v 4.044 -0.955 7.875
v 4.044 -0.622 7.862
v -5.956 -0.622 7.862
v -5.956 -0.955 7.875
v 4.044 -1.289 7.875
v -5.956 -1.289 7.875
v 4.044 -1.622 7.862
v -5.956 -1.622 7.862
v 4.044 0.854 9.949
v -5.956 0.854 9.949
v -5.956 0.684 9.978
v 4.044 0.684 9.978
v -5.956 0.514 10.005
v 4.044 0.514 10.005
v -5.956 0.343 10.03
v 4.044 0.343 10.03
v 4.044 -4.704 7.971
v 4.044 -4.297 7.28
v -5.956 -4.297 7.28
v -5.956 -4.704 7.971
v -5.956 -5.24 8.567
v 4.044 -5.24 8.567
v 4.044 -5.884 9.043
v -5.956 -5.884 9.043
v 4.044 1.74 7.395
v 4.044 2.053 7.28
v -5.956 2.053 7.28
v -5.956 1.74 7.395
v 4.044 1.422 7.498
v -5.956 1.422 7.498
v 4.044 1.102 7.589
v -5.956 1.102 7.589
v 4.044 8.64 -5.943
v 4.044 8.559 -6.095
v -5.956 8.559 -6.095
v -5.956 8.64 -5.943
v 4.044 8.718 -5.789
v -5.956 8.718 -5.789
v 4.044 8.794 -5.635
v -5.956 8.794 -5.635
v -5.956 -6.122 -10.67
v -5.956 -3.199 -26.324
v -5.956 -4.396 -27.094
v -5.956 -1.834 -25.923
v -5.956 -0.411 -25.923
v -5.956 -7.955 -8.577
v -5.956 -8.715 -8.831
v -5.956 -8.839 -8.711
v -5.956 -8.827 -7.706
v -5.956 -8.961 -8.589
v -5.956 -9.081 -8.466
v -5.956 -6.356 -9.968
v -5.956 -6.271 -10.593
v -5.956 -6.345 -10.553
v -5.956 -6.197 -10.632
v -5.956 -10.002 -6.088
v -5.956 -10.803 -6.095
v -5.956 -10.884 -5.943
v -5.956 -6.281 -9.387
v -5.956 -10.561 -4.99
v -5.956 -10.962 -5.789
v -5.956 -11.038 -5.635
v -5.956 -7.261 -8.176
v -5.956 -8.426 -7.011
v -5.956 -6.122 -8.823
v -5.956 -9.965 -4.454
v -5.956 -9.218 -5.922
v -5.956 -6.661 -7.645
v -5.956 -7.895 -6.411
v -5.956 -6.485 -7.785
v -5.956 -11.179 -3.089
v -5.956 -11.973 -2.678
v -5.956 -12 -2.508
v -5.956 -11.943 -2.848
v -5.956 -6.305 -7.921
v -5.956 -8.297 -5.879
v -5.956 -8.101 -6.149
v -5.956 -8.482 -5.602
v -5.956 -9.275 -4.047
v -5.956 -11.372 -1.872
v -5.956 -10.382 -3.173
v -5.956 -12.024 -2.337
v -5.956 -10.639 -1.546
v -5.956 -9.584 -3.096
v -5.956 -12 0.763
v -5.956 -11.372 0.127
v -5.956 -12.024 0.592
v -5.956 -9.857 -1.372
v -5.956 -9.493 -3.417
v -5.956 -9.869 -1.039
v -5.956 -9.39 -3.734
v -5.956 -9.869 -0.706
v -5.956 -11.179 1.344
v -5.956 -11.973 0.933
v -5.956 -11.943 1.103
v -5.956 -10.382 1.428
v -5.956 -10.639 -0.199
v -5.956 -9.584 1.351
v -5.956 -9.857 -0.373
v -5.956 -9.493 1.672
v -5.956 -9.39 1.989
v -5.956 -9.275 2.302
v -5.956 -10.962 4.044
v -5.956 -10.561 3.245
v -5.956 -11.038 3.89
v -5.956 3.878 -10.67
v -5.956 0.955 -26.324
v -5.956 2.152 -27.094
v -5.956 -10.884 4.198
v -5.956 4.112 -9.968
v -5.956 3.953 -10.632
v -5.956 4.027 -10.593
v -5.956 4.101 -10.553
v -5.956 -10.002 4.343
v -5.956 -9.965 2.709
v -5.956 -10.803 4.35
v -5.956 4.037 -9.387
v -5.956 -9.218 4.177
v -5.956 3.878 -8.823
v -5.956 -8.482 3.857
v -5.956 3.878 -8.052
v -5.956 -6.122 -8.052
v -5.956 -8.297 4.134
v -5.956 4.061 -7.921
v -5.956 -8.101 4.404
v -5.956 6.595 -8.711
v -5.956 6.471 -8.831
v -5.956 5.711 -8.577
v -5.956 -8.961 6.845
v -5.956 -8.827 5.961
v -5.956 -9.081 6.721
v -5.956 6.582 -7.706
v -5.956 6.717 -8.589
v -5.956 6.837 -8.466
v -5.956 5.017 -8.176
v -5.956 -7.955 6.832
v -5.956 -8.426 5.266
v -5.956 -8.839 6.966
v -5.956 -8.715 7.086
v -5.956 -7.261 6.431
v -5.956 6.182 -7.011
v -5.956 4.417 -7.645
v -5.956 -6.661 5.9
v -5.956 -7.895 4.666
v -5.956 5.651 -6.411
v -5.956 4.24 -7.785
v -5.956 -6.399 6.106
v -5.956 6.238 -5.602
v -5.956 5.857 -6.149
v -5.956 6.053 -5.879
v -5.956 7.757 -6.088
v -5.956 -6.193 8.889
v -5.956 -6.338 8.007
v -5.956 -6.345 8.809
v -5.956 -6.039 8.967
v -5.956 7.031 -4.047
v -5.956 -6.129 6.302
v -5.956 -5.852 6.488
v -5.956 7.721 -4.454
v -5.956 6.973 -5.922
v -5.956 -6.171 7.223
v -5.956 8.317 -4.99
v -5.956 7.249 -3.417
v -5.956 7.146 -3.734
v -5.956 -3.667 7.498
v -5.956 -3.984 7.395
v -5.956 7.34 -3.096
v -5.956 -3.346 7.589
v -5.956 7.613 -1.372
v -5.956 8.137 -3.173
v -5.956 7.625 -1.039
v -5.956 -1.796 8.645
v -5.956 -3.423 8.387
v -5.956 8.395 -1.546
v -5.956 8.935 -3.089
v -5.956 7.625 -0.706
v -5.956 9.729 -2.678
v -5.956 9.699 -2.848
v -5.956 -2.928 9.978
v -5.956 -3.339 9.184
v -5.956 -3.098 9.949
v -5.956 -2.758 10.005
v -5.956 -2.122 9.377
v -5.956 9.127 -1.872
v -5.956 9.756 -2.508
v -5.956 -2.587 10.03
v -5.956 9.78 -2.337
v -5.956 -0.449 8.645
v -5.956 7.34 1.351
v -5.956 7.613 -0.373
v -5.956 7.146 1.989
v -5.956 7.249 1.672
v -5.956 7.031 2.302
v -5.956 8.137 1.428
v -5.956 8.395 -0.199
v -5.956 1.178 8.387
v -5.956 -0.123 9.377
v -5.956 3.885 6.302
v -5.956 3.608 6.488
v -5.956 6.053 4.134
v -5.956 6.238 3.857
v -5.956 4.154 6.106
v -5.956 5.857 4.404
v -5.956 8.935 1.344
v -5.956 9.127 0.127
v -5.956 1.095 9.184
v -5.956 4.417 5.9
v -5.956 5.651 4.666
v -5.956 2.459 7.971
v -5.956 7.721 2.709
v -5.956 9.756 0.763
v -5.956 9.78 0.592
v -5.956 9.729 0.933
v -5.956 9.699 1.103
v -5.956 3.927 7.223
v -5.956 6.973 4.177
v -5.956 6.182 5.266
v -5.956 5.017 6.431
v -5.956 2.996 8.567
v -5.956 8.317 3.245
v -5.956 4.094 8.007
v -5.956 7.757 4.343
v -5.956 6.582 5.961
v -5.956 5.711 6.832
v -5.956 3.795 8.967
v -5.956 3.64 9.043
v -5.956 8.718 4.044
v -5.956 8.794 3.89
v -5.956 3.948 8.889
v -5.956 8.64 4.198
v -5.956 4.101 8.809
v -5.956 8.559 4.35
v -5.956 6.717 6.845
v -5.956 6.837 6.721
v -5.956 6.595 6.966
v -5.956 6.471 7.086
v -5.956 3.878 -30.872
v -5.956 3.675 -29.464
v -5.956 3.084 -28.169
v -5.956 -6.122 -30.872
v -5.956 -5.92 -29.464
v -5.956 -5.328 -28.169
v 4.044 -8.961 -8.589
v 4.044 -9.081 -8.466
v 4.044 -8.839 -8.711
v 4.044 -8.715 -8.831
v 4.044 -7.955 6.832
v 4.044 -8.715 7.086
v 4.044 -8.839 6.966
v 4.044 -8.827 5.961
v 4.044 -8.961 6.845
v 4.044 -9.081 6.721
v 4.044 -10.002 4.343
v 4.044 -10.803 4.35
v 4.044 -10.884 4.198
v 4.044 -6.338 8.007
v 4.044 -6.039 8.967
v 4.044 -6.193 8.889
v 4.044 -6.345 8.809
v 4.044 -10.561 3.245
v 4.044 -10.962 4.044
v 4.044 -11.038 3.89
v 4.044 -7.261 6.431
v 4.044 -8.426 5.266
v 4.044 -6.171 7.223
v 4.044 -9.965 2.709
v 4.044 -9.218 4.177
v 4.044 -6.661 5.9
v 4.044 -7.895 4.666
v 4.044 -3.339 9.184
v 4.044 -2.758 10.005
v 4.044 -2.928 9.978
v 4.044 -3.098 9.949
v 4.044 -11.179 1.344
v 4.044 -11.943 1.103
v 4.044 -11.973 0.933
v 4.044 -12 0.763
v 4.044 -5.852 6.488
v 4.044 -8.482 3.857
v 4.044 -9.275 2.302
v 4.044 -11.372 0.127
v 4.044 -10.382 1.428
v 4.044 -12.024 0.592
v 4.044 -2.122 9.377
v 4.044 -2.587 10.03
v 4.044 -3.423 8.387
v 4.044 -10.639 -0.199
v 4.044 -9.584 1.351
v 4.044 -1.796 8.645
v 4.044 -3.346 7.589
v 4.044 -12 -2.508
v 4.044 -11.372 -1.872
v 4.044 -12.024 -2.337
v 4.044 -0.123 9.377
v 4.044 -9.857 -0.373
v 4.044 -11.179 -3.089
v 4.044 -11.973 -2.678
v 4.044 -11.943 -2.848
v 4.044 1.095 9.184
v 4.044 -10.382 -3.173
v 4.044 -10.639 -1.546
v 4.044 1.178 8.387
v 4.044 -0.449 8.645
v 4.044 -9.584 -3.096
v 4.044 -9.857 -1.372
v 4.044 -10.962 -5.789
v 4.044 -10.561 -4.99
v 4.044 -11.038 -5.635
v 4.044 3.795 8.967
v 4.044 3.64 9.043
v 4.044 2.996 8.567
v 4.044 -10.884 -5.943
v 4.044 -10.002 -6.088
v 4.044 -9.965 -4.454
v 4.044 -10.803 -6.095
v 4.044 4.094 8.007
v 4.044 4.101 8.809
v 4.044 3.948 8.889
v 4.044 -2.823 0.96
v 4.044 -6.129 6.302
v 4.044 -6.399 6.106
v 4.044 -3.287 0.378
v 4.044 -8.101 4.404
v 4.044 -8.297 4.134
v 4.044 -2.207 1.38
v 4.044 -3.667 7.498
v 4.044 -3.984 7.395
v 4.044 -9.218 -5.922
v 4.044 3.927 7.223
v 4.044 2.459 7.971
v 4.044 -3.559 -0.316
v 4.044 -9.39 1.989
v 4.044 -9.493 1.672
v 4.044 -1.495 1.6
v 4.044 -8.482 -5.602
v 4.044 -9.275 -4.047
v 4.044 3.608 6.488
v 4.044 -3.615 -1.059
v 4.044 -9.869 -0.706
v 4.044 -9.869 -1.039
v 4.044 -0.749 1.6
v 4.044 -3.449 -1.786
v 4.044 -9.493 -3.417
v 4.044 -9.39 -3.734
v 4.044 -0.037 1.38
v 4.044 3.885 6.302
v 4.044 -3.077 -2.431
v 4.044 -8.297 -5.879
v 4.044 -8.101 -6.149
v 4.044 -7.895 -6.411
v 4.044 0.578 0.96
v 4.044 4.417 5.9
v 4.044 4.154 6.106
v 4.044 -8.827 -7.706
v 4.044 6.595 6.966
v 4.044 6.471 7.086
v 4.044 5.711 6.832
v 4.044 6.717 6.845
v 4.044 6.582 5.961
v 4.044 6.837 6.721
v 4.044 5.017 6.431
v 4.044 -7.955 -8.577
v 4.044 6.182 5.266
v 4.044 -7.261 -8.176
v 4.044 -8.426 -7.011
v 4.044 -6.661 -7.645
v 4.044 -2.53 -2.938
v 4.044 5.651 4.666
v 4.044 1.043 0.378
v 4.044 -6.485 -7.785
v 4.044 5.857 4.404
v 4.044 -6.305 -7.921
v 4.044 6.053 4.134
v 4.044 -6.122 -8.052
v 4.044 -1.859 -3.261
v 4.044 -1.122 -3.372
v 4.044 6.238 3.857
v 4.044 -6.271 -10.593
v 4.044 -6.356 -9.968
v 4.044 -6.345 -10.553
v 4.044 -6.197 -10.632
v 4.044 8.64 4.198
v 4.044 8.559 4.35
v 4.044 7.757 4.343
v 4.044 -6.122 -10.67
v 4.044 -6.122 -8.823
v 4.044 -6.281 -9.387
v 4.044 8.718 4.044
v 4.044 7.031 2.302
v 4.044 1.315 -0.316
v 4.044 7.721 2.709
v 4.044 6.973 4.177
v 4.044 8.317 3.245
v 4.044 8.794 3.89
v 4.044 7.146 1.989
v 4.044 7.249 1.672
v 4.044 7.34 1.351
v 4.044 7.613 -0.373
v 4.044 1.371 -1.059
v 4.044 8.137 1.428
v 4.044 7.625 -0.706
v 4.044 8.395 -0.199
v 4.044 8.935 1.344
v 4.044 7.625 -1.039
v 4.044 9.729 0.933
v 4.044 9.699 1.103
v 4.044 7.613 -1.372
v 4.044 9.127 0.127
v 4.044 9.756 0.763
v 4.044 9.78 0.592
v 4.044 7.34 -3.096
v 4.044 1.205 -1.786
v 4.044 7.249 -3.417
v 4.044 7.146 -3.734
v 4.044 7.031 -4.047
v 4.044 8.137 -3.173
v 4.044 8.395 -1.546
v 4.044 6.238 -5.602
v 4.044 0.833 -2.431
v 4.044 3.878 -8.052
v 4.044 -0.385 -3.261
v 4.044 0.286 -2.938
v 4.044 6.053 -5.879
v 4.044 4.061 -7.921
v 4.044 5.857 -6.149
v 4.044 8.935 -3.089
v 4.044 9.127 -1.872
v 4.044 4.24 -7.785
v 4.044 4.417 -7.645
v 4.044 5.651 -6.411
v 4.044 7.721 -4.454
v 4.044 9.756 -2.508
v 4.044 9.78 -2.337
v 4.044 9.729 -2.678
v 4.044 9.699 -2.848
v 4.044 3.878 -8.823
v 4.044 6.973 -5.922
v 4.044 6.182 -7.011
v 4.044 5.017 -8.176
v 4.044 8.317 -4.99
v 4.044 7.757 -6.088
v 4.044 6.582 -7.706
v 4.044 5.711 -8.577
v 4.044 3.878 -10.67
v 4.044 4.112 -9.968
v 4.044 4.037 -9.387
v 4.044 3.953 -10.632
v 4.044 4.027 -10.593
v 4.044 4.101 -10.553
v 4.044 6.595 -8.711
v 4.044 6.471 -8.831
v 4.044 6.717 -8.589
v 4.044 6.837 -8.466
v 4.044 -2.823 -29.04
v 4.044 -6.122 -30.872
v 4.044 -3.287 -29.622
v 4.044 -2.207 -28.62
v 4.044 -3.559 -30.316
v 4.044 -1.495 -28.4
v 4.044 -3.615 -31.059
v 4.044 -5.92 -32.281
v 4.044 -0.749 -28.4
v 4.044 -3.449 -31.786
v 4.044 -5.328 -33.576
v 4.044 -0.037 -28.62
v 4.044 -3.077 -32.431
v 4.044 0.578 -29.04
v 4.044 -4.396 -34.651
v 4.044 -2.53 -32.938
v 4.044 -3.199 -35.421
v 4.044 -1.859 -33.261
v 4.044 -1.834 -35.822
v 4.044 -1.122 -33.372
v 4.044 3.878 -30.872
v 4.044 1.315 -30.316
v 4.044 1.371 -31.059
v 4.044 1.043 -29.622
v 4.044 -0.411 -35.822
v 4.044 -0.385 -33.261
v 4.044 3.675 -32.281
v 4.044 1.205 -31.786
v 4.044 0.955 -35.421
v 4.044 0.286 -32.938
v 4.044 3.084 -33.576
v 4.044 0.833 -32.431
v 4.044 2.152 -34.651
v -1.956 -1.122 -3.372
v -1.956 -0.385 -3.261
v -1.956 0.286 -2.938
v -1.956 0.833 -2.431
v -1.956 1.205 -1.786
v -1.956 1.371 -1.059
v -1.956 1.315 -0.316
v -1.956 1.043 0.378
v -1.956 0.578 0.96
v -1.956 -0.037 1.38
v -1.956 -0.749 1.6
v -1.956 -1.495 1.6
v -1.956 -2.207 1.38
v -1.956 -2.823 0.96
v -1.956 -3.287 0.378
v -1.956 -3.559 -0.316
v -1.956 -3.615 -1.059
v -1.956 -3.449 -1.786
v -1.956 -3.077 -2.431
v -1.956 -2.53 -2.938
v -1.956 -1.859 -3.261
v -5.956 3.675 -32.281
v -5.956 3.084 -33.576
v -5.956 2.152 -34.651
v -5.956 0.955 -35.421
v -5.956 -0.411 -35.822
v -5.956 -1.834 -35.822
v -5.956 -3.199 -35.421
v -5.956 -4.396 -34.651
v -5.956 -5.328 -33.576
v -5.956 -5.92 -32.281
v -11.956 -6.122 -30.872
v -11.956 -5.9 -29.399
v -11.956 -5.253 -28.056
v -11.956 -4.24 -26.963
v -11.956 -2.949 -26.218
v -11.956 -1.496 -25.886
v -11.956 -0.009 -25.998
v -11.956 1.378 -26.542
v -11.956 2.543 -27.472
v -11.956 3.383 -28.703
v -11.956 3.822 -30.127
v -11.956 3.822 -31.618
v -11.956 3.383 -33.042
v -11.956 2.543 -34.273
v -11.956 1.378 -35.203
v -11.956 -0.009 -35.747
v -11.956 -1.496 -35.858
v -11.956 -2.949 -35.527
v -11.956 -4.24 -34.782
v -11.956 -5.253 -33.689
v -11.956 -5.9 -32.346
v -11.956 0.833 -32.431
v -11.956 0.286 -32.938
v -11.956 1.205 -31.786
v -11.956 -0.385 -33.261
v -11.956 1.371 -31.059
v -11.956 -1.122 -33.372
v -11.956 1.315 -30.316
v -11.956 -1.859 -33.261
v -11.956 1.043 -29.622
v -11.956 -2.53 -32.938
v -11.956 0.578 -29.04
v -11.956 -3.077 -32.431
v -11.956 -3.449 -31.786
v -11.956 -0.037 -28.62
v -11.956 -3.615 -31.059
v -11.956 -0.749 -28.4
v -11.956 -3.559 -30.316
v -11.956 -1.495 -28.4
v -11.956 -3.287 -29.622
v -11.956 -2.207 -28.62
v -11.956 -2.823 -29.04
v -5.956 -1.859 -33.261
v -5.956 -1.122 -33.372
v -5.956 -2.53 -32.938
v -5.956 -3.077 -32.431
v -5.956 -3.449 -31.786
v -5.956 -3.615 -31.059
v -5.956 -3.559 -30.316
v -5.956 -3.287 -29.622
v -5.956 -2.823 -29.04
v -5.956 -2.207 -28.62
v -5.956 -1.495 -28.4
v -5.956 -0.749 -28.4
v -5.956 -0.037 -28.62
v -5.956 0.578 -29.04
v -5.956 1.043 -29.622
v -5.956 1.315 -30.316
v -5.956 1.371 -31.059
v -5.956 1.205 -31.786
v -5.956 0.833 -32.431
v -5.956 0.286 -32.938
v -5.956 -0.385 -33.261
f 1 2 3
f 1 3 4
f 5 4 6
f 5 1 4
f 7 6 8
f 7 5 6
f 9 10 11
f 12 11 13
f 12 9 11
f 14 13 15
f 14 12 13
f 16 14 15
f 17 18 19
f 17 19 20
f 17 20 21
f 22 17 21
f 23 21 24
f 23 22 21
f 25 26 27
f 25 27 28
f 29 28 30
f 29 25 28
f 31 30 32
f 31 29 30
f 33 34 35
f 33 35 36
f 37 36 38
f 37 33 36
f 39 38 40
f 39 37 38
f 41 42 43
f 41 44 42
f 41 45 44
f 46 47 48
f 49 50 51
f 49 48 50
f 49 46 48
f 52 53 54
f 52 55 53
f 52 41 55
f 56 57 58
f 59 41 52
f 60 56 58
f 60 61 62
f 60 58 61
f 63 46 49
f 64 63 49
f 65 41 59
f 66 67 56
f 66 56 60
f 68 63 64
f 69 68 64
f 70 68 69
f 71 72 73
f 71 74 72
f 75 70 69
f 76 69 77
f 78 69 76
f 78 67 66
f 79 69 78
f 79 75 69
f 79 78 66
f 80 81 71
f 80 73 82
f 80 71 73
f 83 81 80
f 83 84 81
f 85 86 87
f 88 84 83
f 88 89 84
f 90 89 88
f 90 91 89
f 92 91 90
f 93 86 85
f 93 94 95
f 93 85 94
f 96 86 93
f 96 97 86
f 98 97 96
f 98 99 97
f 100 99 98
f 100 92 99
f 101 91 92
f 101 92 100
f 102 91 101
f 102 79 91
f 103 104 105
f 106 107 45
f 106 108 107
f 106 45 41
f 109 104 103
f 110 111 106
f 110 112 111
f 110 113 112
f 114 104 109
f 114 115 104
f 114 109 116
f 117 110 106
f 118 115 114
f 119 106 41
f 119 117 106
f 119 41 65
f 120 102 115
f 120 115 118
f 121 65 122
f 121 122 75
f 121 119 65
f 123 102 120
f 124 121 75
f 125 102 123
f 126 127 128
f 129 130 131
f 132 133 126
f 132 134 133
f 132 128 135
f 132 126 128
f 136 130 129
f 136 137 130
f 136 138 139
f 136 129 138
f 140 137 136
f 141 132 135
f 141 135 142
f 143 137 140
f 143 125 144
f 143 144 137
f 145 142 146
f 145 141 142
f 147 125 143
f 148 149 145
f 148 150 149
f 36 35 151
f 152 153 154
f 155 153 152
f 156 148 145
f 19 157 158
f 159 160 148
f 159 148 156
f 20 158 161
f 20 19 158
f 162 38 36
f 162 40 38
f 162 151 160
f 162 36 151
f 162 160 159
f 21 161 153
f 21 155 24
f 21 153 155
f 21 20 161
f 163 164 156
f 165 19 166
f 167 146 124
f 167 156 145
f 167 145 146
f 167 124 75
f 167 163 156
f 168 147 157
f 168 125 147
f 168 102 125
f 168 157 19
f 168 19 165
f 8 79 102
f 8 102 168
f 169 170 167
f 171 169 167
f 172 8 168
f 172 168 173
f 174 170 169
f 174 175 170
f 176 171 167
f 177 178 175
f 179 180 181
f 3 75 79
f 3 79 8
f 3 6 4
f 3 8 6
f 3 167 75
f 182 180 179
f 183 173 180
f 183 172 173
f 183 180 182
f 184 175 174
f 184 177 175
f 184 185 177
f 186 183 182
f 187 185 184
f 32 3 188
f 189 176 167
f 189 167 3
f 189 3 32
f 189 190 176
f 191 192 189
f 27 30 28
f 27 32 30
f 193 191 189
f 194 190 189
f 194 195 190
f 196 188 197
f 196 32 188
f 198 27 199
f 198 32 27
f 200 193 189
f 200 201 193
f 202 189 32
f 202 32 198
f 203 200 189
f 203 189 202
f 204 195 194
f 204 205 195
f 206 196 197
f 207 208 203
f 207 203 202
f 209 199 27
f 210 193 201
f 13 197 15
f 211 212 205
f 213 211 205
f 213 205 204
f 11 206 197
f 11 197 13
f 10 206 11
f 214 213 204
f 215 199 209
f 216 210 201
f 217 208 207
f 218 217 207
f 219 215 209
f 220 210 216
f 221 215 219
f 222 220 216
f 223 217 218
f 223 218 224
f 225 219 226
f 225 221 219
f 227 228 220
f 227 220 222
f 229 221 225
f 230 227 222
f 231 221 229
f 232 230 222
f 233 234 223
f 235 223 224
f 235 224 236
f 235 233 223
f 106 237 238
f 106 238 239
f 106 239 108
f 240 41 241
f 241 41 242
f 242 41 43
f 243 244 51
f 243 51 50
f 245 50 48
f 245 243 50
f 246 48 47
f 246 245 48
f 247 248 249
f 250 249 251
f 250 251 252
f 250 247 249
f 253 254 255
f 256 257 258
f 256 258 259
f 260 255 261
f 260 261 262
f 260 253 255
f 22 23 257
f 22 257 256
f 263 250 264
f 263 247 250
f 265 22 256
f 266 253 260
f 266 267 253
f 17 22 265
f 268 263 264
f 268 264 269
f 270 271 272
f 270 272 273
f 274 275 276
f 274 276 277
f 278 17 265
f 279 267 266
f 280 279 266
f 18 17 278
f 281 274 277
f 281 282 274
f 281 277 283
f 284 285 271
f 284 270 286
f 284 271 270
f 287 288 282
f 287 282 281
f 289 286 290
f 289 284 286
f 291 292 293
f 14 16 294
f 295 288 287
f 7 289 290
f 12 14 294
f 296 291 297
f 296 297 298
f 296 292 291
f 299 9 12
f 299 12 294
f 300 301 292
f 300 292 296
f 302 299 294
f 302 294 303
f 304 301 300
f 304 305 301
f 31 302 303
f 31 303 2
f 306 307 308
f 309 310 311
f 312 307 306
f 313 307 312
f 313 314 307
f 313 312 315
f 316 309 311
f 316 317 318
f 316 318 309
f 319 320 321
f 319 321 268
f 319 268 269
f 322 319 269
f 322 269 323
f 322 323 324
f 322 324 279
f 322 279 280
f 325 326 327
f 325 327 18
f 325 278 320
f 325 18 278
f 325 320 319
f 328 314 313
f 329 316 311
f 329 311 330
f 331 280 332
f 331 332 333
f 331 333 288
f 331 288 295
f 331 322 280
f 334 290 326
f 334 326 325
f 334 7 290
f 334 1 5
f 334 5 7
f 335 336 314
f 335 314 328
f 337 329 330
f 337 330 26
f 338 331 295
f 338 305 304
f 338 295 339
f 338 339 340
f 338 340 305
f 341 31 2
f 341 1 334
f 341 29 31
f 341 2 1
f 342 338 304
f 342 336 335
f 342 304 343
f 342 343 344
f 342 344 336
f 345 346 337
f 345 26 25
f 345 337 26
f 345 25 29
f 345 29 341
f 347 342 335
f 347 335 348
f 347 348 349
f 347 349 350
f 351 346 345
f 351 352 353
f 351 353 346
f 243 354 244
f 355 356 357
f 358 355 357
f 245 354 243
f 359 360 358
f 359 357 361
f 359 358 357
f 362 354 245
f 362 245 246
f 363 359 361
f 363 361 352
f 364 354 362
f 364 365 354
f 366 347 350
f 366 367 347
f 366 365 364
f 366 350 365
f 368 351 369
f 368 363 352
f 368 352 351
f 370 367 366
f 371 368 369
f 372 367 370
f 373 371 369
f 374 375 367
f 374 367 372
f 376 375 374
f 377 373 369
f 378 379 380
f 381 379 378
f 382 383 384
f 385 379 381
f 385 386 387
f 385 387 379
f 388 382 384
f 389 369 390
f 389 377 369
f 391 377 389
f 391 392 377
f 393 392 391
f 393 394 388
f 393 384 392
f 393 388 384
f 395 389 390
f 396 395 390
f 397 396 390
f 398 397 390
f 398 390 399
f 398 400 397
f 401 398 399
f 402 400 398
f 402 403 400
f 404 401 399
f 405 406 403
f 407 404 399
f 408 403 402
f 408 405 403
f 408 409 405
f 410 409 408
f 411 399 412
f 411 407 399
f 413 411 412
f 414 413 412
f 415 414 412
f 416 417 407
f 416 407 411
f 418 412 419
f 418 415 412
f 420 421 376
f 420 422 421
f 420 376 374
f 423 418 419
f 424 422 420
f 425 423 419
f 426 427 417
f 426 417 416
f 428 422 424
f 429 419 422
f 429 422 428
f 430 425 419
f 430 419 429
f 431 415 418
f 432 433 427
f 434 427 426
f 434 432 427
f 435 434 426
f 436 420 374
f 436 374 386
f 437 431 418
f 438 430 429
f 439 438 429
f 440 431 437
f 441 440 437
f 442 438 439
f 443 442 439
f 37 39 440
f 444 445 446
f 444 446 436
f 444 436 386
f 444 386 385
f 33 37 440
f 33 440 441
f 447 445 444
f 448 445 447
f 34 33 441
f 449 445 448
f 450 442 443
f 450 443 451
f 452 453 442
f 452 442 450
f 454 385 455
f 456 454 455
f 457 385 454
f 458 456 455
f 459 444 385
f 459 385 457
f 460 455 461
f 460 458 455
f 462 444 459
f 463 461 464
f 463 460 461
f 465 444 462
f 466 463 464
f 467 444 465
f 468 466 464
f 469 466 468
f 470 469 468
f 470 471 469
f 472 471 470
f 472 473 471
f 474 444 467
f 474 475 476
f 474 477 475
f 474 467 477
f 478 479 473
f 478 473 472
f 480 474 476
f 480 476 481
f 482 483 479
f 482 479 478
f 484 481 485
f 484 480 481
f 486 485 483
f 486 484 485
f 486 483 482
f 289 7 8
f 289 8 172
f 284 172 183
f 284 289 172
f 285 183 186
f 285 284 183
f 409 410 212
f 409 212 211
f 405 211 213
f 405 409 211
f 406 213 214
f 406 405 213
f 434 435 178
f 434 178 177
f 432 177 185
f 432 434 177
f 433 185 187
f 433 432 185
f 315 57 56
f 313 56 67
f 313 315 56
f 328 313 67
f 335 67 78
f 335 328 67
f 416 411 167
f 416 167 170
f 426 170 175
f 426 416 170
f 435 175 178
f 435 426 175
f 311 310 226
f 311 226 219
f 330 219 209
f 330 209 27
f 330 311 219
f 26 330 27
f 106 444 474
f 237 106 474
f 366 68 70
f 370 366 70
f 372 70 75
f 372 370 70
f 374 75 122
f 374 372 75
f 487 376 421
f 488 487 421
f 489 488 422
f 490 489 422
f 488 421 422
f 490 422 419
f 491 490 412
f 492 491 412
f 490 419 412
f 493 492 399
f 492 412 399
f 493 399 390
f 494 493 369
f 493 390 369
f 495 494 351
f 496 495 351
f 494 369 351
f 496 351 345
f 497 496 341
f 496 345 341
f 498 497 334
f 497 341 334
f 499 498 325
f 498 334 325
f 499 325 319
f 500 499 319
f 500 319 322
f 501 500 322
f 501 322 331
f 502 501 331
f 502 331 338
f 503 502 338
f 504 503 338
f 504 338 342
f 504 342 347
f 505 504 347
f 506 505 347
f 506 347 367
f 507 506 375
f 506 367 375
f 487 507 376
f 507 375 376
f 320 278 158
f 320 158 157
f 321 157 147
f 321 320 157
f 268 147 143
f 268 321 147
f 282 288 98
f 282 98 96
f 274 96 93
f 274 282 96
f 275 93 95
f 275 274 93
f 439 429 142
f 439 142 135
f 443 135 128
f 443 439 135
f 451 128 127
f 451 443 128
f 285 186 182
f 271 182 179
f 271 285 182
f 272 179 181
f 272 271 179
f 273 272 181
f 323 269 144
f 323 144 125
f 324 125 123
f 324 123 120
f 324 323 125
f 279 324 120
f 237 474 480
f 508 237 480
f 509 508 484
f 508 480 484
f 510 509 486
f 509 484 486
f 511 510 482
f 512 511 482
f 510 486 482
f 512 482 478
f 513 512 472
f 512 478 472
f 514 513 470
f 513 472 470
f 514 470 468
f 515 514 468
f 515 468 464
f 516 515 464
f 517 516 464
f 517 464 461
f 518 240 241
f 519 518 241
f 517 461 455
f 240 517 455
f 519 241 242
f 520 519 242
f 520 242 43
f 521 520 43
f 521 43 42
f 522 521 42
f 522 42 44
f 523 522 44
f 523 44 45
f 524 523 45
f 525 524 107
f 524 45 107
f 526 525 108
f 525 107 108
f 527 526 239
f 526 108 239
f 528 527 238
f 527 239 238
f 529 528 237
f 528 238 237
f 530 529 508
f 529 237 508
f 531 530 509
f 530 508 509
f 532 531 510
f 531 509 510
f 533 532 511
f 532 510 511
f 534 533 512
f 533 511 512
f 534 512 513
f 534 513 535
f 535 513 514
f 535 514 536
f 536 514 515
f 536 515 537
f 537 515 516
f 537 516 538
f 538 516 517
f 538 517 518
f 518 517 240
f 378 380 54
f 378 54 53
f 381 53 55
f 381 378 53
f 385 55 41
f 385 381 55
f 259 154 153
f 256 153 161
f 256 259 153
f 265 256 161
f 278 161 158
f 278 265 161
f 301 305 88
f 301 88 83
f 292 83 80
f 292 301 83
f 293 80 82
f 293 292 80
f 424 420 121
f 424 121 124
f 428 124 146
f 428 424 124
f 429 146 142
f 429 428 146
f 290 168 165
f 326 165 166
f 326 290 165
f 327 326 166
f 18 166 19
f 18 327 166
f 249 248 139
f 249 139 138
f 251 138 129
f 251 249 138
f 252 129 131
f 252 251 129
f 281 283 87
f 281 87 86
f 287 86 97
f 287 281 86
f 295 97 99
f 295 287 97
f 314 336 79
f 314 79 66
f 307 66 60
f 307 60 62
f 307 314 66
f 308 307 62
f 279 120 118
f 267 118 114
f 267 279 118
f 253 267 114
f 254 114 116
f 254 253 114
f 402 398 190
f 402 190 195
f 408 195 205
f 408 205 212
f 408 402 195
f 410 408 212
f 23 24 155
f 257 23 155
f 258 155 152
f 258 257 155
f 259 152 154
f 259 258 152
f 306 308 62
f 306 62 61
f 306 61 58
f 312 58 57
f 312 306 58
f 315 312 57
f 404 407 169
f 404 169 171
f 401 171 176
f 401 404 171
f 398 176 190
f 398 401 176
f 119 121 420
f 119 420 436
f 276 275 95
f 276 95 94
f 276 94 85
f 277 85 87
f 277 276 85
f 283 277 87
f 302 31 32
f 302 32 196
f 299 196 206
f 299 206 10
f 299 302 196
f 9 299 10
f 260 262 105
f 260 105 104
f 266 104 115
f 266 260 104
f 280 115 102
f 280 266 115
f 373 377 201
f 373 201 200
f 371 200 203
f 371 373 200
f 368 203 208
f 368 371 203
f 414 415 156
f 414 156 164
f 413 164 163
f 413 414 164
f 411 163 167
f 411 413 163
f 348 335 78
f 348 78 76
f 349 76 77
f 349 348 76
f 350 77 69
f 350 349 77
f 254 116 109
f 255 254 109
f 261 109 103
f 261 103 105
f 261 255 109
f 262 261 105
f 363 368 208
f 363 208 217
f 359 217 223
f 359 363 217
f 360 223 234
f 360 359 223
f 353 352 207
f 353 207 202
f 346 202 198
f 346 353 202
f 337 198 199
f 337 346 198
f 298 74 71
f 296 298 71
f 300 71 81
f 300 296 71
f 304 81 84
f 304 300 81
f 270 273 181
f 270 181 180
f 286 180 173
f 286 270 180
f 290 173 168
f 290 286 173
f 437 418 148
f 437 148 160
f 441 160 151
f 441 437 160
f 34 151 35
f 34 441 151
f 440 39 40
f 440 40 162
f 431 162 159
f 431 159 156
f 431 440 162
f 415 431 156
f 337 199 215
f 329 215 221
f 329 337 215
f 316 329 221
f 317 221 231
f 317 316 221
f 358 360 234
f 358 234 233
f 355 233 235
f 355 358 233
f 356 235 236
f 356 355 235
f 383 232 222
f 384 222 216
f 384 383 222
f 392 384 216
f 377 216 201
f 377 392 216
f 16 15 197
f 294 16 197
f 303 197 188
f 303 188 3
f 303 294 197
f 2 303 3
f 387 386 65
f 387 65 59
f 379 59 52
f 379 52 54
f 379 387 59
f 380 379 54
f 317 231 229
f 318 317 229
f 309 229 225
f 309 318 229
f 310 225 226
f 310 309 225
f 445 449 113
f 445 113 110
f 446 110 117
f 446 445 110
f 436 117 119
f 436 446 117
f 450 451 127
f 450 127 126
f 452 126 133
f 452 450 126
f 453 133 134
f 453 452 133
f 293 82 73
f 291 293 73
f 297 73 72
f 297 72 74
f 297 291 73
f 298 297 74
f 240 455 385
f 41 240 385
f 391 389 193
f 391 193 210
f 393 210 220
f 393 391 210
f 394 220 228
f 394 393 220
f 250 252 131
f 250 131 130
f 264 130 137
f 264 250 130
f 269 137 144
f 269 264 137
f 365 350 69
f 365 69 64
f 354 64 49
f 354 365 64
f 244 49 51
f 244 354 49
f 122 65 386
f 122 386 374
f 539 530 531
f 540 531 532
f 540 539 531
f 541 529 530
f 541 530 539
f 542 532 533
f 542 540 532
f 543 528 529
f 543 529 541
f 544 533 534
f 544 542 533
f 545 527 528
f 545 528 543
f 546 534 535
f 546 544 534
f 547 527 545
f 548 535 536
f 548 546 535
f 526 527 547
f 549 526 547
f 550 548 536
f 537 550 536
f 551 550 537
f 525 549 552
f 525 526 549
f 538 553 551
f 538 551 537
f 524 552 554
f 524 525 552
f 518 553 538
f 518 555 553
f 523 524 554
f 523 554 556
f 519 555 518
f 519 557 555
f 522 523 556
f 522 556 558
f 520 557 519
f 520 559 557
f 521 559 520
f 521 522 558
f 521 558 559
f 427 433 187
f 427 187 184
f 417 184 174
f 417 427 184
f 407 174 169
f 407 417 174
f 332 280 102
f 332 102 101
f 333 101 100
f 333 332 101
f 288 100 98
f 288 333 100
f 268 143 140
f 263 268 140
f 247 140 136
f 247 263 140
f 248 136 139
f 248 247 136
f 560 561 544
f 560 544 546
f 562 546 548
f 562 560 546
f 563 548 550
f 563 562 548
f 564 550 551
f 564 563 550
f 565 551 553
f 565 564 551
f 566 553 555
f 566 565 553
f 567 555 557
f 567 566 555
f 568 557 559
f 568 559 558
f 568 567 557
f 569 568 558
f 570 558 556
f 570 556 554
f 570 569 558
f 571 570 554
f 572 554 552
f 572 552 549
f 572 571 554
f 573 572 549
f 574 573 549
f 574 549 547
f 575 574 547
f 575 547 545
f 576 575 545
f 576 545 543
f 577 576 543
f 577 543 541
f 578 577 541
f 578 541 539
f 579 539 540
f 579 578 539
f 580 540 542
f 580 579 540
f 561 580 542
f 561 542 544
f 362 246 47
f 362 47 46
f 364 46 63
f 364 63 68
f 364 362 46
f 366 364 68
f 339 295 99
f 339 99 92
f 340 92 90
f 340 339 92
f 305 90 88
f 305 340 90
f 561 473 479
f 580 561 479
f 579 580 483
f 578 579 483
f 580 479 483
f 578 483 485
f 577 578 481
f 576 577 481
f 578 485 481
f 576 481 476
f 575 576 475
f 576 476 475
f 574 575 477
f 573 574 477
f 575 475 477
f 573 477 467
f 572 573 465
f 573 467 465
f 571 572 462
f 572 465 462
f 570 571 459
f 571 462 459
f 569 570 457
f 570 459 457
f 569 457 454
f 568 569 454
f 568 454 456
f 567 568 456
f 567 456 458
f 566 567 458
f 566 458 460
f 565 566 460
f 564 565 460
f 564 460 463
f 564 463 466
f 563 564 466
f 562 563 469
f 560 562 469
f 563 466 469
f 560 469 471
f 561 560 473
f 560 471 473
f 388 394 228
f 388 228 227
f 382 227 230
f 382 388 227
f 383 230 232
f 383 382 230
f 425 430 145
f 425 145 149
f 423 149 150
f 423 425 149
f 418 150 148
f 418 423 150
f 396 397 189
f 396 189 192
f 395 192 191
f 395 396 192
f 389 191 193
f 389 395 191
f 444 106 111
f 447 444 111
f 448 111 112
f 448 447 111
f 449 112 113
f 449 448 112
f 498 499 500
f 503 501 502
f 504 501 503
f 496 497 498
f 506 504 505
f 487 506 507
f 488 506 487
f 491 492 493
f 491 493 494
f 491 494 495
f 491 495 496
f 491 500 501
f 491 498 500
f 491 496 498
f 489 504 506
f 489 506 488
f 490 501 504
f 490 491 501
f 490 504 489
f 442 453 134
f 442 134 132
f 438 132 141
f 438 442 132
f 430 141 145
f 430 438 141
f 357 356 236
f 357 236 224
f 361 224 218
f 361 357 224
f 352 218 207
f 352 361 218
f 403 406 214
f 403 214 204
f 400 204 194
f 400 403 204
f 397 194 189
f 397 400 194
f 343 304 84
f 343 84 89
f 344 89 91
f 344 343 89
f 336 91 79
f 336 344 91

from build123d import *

# Parameters (mm, degrees)
SKETCH1_R           = 2.5
BOSS_EXTRUDE1_DEPTH = 10
SKETCH2_R           = 2.5
BOSS_EXTRUDE2_DEPTH = 10
SKETCH3_R           = 5
SKETCH3_R_2         = 2.5
BOSS_EXTRUDE3_DEPTH = 6
SKETCH4_R           = 2.5
CUT_EXTRUDE1_DEPTH  = 6


with BuildPart() as part:
    # Sketch1 → Boss-Extrude1 (new body)
    with BuildSketch(Plane(origin=(4.043870029, 0, 0), x_dir=(0, 0, -1), z_dir=(1, 0, 0))):
        with BuildLine():
            ThreePointArc((-10.029541992, 0.342879069), (-9.019080639, -0.304016541), (-7.862233613, -0.622153359))
            ThreePointArc((-7.862233613, -0.622153359), (-7.876528296, -1.122077366), (-7.862233613, -1.622001374))
            ThreePointArc((-7.862233613, -1.622001374), (-9.019080639, -1.940138191), (-10.029541992, -2.587033801))
            ThreePointArc((-10.029541992, -2.587033801), (-9.992100042, -2.842856482), (-9.948655897, -3.097728508))
            ThreePointArc((-9.948655897, -3.097728508), (-8.787748306, -3.400713063), (-7.58921172, -3.345793765))
            ThreePointArc((-7.58921172, -3.345793765), (-7.448321757, -3.82566705), (-7.280241692, -4.296705735))
            ThreePointArc((-7.280241692, -4.296705735), (-8.282158911, -4.956757219), (-9.043263028, -5.884241235))
            ThreePointArc((-9.043263028, -5.884241235), (-8.928600062, -6.115972863), (-8.808522437, -6.344945585))
            ThreePointArc((-8.808522437, -6.344945585), (-7.610806331, -6.274360846), (-6.487901298, -5.851761317))
            ThreePointArc((-6.487901298, -5.851761317), (-6.20561798, -6.264610538), (-5.90020538, -6.660655353))
            ThreePointArc((-5.90020538, -6.660655353), (-6.649118154, -7.598011066), (-7.086362862, -8.715294889))
            ThreePointArc((-7.086362862, -8.715294889), (-6.905702889, -8.900251959), (-6.720745819, -9.080911932))
            ThreePointArc((-6.720745819, -9.080911932), (-5.603461996, -8.643667224), (-4.666106283, -7.89475445))
            ThreePointArc((-4.666106283, -7.89475445), (-4.270061468, -8.20016705), (-3.857212247, -8.482450368))
            ThreePointArc((-3.857212247, -8.482450368), (-4.279811776, -9.605355401), (-4.350396515, -10.803071507))
            ThreePointArc((-4.350396515, -10.803071507), (-4.121423793, -10.923149132), (-3.889692165, -11.037812099))
            ThreePointArc((-3.889692165, -11.037812099), (-2.962208149, -10.276707981), (-2.302156665, -9.274790762))
            ThreePointArc((-2.302156665, -9.274790762), (-1.83111798, -9.442870827), (-1.351244695, -9.583760791))
            ThreePointArc((-1.351244695, -9.583760791), (-1.406163992, -10.782297376), (-1.103179437, -11.943204968))
            ThreePointArc((-1.103179437, -11.943204968), (-0.848307411, -11.986649113), (-0.592484731, -12.024091063))
            ThreePointArc((-0.592484731, -12.024091063), (0.054410879, -11.01362971), (0.372547697, -9.856782684))
            ThreePointArc((0.372547697, -9.856782684), (0.872471704, -9.871077366), (1.372395712, -9.856782684))
            ThreePointArc((1.372395712, -9.856782684), (1.690532529, -11.01362971), (2.337428139, -12.024091063))
            ThreePointArc((2.337428139, -12.024091063), (2.59325082, -11.986649113), (2.848122846, -11.943204968))
            ThreePointArc((2.848122846, -11.943204968), (3.151107401, -10.782297376), (3.096188103, -9.583760791))
            ThreePointArc((3.096188103, -9.583760791), (3.576061388, -9.442870827), (4.047100073, -9.274790762))
            ThreePointArc((4.047100073, -9.274790762), (4.707151558, -10.276707981), (5.634635573, -11.037812099))
            ThreePointArc((5.634635573, -11.037812099), (5.866367201, -10.923149132), (6.095339923, -10.803071507))
            ThreePointArc((6.095339923, -10.803071507), (6.024755184, -9.605355401), (5.602155655, -8.482450368))
            ThreePointArc((5.602155655, -8.482450368), (6.015004877, -8.20016705), (6.411049691, -7.89475445))
            ThreePointArc((6.411049691, -7.89475445), (7.348405404, -8.643667224), (8.465689227, -9.080911932))
            ThreePointArc((8.465689227, -9.080911932), (8.650646297, -8.900251959), (8.83130627, -8.715294889))
            ThreePointArc((8.83130627, -8.715294889), (8.394061563, -7.598011066), (7.645148788, -6.660655353))
            ThreePointArc((7.645148788, -6.660655353), (7.950561388, -6.264610538), (8.232844706, -5.851761317))
            ThreePointArc((8.232844706, -5.851761317), (9.355749739, -6.274360846), (10.553465846, -6.344945585))
            ThreePointArc((10.553465846, -6.344945585), (10.67354347, -6.115972863), (10.788206437, -5.884241235))
            ThreePointArc((10.788206437, -5.884241235), (10.02710232, -4.956757219), (9.0251851, -4.296705735))
            ThreePointArc((9.0251851, -4.296705735), (9.193265165, -3.82566705), (9.334155129, -3.345793765))
            ThreePointArc((9.334155129, -3.345793765), (10.532691714, -3.400713063), (11.693599306, -3.097728508))
            ThreePointArc((11.693599306, -3.097728508), (11.737043451, -2.842856482), (11.774485401, -2.587033801))
            ThreePointArc((11.774485401, -2.587033801), (10.764024048, -1.940138191), (9.607177022, -1.622001374))
            ThreePointArc((9.607177022, -1.622001374), (9.621471704, -1.122077366), (9.607177022, -0.622153359))
            ThreePointArc((9.607177022, -0.622153359), (10.764024048, -0.304016541), (11.774485401, 0.342879069))
            ThreePointArc((11.774485401, 0.342879069), (11.737043451, 0.598701749), (11.693599306, 0.853573775))
            ThreePointArc((11.693599306, 0.853573775), (10.532691714, 1.156558331), (9.334155129, 1.101639033))
            ThreePointArc((9.334155129, 1.101639033), (9.193265165, 1.581512318), (9.0251851, 2.052551003))
            ThreePointArc((9.0251851, 2.052551003), (10.02710232, 2.712602487), (10.788206437, 3.640086503))
            ThreePointArc((10.788206437, 3.640086503), (10.67354347, 3.871818131), (10.553465846, 4.100790853))
            ThreePointArc((10.553465846, 4.100790853), (9.355749739, 4.030206114), (8.232844706, 3.607606585))
            ThreePointArc((8.232844706, 3.607606585), (7.950561388, 4.020455806), (7.645148788, 4.416500621))
            ThreePointArc((7.645148788, 4.416500621), (8.394061563, 5.353856334), (8.83130627, 6.471140157))
            ThreePointArc((8.83130627, 6.471140157), (8.650646297, 6.656097227), (8.465689227, 6.8367572))
            ThreePointArc((8.465689227, 6.8367572), (7.348405404, 6.399512492), (6.411049691, 5.650599718))
            ThreePointArc((6.411049691, 5.650599718), (6.015004877, 5.956012318), (5.602155655, 6.238295636))
            ThreePointArc((5.602155655, 6.238295636), (6.024755184, 7.361200669), (6.095339923, 8.558916775))
            ThreePointArc((6.095339923, 8.558916775), (5.866367201, 8.6789944), (5.634635573, 8.793657366))
            ThreePointArc((5.634635573, 8.793657366), (4.707151558, 8.032553249), (4.047100073, 7.03063603))
            ThreePointArc((4.047100073, 7.03063603), (3.576061388, 7.198716095), (3.096188103, 7.339606058))
            ThreePointArc((3.096188103, 7.339606058), (3.151107401, 8.538142644), (2.848122846, 9.699050235))
            ThreePointArc((2.848122846, 9.699050235), (2.59325082, 9.74249438), (2.337428139, 9.779936331))
            ThreePointArc((2.337428139, 9.779936331), (1.690532529, 8.769474978), (1.372395712, 7.612627952))
            ThreePointArc((1.372395712, 7.612627952), (0.872471704, 7.626922634), (0.372547697, 7.612627952))
            ThreePointArc((0.372547697, 7.612627952), (0.054410879, 8.769474978), (-0.592484731, 9.779936331))
            ThreePointArc((-0.592484731, 9.779936331), (-0.848307411, 9.74249438), (-1.103179437, 9.699050235))
            ThreePointArc((-1.103179437, 9.699050235), (-1.406163992, 8.538142644), (-1.351244695, 7.339606058))
            ThreePointArc((-1.351244695, 7.339606058), (-1.83111798, 7.198716095), (-2.302156665, 7.03063603))
            ThreePointArc((-2.302156665, 7.03063603), (-2.962208149, 8.032553249), (-3.889692165, 8.793657366))
            ThreePointArc((-3.889692165, 8.793657366), (-4.121423793, 8.6789944), (-4.350396515, 8.558916775))
            ThreePointArc((-4.350396515, 8.558916775), (-4.279811776, 7.361200669), (-3.857212247, 6.238295636))
            ThreePointArc((-3.857212247, 6.238295636), (-4.270061468, 5.956012318), (-4.666106283, 5.650599718))
            ThreePointArc((-4.666106283, 5.650599718), (-5.603461996, 6.399512492), (-6.720745819, 6.8367572))
            ThreePointArc((-6.720745819, 6.8367572), (-6.905702889, 6.656097227), (-7.086362862, 6.471140157))
            ThreePointArc((-7.086362862, 6.471140157), (-6.649118154, 5.353856334), (-5.90020538, 4.416500621))
            ThreePointArc((-5.90020538, 4.416500621), (-6.20561798, 4.020455806), (-6.487901298, 3.607606585))
            ThreePointArc((-6.487901298, 3.607606585), (-7.610806331, 4.030206114), (-8.808522437, 4.100790853))
            ThreePointArc((-8.808522437, 4.100790853), (-8.928600062, 3.871818131), (-9.043263028, 3.640086503))
            ThreePointArc((-9.043263028, 3.640086503), (-8.282158911, 2.712602487), (-7.280241692, 2.052551003))
            ThreePointArc((-7.280241692, 2.052551003), (-7.448321757, 1.581512318), (-7.58921172, 1.101639033))
            ThreePointArc((-7.58921172, 1.101639033), (-8.787748306, 1.156558331), (-9.948655897, 0.853573775))
            ThreePointArc((-9.948655897, 0.853573775), (-9.992100042, 0.598701749), (-10.029541992, 0.342879069))
        make_face()
        with Locations(Location((0.872471704, -1.122077366, 0), (0, 0, 180))):
            Circle(SKETCH1_R, mode=Mode.SUBTRACT)
    extrude(amount=-BOSS_EXTRUDE1_DEPTH)

    # Sketch2 → Boss-Extrude2 (add)
    with BuildSketch(Plane(origin=(4.043870029, 0, 0), x_dir=(0, 0, -1), z_dir=(1, 0, 0))):
        with BuildLine():
            Line((0.872471704, 3.877922634), (30.872471704, 3.877922634))
            ThreePointArc((30.872471704, 3.877922634), (35.872471704, -1.122077366), (30.872471704, -6.122077366))
            Line((30.872471704, -6.122077366), (0.872471704, -6.122077366))
            ThreePointArc((0.872471704, -6.122077366), (-4.127528296, -1.122077366), (0.872471704, 3.877922634))
        make_face()
        with Locations((30.872471704, -1.122077366)):
            Circle(SKETCH2_R, mode=Mode.SUBTRACT)
    extrude(amount=-BOSS_EXTRUDE2_DEPTH)

    # Sketch3 → Boss-Extrude3 (add)
    with BuildSketch(Plane.ZY.offset(5.956129971)):
        with Locations(Location((-30.872471704, -1.122077366, 0), (0, 0, 270))):
            Circle(SKETCH3_R)
        with Locations(Location((-30.872471704, -1.122077366, 0), (0, 0, 180))):
            Circle(SKETCH3_R_2, mode=Mode.SUBTRACT)
    extrude(amount=BOSS_EXTRUDE3_DEPTH)

    # Sketch4 → Cut-Extrude1 (cut)
    with BuildSketch(Plane(origin=(4.043870029, 0, 0), x_dir=(0, 0, -1), z_dir=(1, 0, 0))):
        with Locations((0.872471704, -1.122077366)):
            Circle(SKETCH4_R)
    extrude(amount=-CUT_EXTRUDE1_DEPTH, mode=Mode.SUBTRACT)


solid = part.part
